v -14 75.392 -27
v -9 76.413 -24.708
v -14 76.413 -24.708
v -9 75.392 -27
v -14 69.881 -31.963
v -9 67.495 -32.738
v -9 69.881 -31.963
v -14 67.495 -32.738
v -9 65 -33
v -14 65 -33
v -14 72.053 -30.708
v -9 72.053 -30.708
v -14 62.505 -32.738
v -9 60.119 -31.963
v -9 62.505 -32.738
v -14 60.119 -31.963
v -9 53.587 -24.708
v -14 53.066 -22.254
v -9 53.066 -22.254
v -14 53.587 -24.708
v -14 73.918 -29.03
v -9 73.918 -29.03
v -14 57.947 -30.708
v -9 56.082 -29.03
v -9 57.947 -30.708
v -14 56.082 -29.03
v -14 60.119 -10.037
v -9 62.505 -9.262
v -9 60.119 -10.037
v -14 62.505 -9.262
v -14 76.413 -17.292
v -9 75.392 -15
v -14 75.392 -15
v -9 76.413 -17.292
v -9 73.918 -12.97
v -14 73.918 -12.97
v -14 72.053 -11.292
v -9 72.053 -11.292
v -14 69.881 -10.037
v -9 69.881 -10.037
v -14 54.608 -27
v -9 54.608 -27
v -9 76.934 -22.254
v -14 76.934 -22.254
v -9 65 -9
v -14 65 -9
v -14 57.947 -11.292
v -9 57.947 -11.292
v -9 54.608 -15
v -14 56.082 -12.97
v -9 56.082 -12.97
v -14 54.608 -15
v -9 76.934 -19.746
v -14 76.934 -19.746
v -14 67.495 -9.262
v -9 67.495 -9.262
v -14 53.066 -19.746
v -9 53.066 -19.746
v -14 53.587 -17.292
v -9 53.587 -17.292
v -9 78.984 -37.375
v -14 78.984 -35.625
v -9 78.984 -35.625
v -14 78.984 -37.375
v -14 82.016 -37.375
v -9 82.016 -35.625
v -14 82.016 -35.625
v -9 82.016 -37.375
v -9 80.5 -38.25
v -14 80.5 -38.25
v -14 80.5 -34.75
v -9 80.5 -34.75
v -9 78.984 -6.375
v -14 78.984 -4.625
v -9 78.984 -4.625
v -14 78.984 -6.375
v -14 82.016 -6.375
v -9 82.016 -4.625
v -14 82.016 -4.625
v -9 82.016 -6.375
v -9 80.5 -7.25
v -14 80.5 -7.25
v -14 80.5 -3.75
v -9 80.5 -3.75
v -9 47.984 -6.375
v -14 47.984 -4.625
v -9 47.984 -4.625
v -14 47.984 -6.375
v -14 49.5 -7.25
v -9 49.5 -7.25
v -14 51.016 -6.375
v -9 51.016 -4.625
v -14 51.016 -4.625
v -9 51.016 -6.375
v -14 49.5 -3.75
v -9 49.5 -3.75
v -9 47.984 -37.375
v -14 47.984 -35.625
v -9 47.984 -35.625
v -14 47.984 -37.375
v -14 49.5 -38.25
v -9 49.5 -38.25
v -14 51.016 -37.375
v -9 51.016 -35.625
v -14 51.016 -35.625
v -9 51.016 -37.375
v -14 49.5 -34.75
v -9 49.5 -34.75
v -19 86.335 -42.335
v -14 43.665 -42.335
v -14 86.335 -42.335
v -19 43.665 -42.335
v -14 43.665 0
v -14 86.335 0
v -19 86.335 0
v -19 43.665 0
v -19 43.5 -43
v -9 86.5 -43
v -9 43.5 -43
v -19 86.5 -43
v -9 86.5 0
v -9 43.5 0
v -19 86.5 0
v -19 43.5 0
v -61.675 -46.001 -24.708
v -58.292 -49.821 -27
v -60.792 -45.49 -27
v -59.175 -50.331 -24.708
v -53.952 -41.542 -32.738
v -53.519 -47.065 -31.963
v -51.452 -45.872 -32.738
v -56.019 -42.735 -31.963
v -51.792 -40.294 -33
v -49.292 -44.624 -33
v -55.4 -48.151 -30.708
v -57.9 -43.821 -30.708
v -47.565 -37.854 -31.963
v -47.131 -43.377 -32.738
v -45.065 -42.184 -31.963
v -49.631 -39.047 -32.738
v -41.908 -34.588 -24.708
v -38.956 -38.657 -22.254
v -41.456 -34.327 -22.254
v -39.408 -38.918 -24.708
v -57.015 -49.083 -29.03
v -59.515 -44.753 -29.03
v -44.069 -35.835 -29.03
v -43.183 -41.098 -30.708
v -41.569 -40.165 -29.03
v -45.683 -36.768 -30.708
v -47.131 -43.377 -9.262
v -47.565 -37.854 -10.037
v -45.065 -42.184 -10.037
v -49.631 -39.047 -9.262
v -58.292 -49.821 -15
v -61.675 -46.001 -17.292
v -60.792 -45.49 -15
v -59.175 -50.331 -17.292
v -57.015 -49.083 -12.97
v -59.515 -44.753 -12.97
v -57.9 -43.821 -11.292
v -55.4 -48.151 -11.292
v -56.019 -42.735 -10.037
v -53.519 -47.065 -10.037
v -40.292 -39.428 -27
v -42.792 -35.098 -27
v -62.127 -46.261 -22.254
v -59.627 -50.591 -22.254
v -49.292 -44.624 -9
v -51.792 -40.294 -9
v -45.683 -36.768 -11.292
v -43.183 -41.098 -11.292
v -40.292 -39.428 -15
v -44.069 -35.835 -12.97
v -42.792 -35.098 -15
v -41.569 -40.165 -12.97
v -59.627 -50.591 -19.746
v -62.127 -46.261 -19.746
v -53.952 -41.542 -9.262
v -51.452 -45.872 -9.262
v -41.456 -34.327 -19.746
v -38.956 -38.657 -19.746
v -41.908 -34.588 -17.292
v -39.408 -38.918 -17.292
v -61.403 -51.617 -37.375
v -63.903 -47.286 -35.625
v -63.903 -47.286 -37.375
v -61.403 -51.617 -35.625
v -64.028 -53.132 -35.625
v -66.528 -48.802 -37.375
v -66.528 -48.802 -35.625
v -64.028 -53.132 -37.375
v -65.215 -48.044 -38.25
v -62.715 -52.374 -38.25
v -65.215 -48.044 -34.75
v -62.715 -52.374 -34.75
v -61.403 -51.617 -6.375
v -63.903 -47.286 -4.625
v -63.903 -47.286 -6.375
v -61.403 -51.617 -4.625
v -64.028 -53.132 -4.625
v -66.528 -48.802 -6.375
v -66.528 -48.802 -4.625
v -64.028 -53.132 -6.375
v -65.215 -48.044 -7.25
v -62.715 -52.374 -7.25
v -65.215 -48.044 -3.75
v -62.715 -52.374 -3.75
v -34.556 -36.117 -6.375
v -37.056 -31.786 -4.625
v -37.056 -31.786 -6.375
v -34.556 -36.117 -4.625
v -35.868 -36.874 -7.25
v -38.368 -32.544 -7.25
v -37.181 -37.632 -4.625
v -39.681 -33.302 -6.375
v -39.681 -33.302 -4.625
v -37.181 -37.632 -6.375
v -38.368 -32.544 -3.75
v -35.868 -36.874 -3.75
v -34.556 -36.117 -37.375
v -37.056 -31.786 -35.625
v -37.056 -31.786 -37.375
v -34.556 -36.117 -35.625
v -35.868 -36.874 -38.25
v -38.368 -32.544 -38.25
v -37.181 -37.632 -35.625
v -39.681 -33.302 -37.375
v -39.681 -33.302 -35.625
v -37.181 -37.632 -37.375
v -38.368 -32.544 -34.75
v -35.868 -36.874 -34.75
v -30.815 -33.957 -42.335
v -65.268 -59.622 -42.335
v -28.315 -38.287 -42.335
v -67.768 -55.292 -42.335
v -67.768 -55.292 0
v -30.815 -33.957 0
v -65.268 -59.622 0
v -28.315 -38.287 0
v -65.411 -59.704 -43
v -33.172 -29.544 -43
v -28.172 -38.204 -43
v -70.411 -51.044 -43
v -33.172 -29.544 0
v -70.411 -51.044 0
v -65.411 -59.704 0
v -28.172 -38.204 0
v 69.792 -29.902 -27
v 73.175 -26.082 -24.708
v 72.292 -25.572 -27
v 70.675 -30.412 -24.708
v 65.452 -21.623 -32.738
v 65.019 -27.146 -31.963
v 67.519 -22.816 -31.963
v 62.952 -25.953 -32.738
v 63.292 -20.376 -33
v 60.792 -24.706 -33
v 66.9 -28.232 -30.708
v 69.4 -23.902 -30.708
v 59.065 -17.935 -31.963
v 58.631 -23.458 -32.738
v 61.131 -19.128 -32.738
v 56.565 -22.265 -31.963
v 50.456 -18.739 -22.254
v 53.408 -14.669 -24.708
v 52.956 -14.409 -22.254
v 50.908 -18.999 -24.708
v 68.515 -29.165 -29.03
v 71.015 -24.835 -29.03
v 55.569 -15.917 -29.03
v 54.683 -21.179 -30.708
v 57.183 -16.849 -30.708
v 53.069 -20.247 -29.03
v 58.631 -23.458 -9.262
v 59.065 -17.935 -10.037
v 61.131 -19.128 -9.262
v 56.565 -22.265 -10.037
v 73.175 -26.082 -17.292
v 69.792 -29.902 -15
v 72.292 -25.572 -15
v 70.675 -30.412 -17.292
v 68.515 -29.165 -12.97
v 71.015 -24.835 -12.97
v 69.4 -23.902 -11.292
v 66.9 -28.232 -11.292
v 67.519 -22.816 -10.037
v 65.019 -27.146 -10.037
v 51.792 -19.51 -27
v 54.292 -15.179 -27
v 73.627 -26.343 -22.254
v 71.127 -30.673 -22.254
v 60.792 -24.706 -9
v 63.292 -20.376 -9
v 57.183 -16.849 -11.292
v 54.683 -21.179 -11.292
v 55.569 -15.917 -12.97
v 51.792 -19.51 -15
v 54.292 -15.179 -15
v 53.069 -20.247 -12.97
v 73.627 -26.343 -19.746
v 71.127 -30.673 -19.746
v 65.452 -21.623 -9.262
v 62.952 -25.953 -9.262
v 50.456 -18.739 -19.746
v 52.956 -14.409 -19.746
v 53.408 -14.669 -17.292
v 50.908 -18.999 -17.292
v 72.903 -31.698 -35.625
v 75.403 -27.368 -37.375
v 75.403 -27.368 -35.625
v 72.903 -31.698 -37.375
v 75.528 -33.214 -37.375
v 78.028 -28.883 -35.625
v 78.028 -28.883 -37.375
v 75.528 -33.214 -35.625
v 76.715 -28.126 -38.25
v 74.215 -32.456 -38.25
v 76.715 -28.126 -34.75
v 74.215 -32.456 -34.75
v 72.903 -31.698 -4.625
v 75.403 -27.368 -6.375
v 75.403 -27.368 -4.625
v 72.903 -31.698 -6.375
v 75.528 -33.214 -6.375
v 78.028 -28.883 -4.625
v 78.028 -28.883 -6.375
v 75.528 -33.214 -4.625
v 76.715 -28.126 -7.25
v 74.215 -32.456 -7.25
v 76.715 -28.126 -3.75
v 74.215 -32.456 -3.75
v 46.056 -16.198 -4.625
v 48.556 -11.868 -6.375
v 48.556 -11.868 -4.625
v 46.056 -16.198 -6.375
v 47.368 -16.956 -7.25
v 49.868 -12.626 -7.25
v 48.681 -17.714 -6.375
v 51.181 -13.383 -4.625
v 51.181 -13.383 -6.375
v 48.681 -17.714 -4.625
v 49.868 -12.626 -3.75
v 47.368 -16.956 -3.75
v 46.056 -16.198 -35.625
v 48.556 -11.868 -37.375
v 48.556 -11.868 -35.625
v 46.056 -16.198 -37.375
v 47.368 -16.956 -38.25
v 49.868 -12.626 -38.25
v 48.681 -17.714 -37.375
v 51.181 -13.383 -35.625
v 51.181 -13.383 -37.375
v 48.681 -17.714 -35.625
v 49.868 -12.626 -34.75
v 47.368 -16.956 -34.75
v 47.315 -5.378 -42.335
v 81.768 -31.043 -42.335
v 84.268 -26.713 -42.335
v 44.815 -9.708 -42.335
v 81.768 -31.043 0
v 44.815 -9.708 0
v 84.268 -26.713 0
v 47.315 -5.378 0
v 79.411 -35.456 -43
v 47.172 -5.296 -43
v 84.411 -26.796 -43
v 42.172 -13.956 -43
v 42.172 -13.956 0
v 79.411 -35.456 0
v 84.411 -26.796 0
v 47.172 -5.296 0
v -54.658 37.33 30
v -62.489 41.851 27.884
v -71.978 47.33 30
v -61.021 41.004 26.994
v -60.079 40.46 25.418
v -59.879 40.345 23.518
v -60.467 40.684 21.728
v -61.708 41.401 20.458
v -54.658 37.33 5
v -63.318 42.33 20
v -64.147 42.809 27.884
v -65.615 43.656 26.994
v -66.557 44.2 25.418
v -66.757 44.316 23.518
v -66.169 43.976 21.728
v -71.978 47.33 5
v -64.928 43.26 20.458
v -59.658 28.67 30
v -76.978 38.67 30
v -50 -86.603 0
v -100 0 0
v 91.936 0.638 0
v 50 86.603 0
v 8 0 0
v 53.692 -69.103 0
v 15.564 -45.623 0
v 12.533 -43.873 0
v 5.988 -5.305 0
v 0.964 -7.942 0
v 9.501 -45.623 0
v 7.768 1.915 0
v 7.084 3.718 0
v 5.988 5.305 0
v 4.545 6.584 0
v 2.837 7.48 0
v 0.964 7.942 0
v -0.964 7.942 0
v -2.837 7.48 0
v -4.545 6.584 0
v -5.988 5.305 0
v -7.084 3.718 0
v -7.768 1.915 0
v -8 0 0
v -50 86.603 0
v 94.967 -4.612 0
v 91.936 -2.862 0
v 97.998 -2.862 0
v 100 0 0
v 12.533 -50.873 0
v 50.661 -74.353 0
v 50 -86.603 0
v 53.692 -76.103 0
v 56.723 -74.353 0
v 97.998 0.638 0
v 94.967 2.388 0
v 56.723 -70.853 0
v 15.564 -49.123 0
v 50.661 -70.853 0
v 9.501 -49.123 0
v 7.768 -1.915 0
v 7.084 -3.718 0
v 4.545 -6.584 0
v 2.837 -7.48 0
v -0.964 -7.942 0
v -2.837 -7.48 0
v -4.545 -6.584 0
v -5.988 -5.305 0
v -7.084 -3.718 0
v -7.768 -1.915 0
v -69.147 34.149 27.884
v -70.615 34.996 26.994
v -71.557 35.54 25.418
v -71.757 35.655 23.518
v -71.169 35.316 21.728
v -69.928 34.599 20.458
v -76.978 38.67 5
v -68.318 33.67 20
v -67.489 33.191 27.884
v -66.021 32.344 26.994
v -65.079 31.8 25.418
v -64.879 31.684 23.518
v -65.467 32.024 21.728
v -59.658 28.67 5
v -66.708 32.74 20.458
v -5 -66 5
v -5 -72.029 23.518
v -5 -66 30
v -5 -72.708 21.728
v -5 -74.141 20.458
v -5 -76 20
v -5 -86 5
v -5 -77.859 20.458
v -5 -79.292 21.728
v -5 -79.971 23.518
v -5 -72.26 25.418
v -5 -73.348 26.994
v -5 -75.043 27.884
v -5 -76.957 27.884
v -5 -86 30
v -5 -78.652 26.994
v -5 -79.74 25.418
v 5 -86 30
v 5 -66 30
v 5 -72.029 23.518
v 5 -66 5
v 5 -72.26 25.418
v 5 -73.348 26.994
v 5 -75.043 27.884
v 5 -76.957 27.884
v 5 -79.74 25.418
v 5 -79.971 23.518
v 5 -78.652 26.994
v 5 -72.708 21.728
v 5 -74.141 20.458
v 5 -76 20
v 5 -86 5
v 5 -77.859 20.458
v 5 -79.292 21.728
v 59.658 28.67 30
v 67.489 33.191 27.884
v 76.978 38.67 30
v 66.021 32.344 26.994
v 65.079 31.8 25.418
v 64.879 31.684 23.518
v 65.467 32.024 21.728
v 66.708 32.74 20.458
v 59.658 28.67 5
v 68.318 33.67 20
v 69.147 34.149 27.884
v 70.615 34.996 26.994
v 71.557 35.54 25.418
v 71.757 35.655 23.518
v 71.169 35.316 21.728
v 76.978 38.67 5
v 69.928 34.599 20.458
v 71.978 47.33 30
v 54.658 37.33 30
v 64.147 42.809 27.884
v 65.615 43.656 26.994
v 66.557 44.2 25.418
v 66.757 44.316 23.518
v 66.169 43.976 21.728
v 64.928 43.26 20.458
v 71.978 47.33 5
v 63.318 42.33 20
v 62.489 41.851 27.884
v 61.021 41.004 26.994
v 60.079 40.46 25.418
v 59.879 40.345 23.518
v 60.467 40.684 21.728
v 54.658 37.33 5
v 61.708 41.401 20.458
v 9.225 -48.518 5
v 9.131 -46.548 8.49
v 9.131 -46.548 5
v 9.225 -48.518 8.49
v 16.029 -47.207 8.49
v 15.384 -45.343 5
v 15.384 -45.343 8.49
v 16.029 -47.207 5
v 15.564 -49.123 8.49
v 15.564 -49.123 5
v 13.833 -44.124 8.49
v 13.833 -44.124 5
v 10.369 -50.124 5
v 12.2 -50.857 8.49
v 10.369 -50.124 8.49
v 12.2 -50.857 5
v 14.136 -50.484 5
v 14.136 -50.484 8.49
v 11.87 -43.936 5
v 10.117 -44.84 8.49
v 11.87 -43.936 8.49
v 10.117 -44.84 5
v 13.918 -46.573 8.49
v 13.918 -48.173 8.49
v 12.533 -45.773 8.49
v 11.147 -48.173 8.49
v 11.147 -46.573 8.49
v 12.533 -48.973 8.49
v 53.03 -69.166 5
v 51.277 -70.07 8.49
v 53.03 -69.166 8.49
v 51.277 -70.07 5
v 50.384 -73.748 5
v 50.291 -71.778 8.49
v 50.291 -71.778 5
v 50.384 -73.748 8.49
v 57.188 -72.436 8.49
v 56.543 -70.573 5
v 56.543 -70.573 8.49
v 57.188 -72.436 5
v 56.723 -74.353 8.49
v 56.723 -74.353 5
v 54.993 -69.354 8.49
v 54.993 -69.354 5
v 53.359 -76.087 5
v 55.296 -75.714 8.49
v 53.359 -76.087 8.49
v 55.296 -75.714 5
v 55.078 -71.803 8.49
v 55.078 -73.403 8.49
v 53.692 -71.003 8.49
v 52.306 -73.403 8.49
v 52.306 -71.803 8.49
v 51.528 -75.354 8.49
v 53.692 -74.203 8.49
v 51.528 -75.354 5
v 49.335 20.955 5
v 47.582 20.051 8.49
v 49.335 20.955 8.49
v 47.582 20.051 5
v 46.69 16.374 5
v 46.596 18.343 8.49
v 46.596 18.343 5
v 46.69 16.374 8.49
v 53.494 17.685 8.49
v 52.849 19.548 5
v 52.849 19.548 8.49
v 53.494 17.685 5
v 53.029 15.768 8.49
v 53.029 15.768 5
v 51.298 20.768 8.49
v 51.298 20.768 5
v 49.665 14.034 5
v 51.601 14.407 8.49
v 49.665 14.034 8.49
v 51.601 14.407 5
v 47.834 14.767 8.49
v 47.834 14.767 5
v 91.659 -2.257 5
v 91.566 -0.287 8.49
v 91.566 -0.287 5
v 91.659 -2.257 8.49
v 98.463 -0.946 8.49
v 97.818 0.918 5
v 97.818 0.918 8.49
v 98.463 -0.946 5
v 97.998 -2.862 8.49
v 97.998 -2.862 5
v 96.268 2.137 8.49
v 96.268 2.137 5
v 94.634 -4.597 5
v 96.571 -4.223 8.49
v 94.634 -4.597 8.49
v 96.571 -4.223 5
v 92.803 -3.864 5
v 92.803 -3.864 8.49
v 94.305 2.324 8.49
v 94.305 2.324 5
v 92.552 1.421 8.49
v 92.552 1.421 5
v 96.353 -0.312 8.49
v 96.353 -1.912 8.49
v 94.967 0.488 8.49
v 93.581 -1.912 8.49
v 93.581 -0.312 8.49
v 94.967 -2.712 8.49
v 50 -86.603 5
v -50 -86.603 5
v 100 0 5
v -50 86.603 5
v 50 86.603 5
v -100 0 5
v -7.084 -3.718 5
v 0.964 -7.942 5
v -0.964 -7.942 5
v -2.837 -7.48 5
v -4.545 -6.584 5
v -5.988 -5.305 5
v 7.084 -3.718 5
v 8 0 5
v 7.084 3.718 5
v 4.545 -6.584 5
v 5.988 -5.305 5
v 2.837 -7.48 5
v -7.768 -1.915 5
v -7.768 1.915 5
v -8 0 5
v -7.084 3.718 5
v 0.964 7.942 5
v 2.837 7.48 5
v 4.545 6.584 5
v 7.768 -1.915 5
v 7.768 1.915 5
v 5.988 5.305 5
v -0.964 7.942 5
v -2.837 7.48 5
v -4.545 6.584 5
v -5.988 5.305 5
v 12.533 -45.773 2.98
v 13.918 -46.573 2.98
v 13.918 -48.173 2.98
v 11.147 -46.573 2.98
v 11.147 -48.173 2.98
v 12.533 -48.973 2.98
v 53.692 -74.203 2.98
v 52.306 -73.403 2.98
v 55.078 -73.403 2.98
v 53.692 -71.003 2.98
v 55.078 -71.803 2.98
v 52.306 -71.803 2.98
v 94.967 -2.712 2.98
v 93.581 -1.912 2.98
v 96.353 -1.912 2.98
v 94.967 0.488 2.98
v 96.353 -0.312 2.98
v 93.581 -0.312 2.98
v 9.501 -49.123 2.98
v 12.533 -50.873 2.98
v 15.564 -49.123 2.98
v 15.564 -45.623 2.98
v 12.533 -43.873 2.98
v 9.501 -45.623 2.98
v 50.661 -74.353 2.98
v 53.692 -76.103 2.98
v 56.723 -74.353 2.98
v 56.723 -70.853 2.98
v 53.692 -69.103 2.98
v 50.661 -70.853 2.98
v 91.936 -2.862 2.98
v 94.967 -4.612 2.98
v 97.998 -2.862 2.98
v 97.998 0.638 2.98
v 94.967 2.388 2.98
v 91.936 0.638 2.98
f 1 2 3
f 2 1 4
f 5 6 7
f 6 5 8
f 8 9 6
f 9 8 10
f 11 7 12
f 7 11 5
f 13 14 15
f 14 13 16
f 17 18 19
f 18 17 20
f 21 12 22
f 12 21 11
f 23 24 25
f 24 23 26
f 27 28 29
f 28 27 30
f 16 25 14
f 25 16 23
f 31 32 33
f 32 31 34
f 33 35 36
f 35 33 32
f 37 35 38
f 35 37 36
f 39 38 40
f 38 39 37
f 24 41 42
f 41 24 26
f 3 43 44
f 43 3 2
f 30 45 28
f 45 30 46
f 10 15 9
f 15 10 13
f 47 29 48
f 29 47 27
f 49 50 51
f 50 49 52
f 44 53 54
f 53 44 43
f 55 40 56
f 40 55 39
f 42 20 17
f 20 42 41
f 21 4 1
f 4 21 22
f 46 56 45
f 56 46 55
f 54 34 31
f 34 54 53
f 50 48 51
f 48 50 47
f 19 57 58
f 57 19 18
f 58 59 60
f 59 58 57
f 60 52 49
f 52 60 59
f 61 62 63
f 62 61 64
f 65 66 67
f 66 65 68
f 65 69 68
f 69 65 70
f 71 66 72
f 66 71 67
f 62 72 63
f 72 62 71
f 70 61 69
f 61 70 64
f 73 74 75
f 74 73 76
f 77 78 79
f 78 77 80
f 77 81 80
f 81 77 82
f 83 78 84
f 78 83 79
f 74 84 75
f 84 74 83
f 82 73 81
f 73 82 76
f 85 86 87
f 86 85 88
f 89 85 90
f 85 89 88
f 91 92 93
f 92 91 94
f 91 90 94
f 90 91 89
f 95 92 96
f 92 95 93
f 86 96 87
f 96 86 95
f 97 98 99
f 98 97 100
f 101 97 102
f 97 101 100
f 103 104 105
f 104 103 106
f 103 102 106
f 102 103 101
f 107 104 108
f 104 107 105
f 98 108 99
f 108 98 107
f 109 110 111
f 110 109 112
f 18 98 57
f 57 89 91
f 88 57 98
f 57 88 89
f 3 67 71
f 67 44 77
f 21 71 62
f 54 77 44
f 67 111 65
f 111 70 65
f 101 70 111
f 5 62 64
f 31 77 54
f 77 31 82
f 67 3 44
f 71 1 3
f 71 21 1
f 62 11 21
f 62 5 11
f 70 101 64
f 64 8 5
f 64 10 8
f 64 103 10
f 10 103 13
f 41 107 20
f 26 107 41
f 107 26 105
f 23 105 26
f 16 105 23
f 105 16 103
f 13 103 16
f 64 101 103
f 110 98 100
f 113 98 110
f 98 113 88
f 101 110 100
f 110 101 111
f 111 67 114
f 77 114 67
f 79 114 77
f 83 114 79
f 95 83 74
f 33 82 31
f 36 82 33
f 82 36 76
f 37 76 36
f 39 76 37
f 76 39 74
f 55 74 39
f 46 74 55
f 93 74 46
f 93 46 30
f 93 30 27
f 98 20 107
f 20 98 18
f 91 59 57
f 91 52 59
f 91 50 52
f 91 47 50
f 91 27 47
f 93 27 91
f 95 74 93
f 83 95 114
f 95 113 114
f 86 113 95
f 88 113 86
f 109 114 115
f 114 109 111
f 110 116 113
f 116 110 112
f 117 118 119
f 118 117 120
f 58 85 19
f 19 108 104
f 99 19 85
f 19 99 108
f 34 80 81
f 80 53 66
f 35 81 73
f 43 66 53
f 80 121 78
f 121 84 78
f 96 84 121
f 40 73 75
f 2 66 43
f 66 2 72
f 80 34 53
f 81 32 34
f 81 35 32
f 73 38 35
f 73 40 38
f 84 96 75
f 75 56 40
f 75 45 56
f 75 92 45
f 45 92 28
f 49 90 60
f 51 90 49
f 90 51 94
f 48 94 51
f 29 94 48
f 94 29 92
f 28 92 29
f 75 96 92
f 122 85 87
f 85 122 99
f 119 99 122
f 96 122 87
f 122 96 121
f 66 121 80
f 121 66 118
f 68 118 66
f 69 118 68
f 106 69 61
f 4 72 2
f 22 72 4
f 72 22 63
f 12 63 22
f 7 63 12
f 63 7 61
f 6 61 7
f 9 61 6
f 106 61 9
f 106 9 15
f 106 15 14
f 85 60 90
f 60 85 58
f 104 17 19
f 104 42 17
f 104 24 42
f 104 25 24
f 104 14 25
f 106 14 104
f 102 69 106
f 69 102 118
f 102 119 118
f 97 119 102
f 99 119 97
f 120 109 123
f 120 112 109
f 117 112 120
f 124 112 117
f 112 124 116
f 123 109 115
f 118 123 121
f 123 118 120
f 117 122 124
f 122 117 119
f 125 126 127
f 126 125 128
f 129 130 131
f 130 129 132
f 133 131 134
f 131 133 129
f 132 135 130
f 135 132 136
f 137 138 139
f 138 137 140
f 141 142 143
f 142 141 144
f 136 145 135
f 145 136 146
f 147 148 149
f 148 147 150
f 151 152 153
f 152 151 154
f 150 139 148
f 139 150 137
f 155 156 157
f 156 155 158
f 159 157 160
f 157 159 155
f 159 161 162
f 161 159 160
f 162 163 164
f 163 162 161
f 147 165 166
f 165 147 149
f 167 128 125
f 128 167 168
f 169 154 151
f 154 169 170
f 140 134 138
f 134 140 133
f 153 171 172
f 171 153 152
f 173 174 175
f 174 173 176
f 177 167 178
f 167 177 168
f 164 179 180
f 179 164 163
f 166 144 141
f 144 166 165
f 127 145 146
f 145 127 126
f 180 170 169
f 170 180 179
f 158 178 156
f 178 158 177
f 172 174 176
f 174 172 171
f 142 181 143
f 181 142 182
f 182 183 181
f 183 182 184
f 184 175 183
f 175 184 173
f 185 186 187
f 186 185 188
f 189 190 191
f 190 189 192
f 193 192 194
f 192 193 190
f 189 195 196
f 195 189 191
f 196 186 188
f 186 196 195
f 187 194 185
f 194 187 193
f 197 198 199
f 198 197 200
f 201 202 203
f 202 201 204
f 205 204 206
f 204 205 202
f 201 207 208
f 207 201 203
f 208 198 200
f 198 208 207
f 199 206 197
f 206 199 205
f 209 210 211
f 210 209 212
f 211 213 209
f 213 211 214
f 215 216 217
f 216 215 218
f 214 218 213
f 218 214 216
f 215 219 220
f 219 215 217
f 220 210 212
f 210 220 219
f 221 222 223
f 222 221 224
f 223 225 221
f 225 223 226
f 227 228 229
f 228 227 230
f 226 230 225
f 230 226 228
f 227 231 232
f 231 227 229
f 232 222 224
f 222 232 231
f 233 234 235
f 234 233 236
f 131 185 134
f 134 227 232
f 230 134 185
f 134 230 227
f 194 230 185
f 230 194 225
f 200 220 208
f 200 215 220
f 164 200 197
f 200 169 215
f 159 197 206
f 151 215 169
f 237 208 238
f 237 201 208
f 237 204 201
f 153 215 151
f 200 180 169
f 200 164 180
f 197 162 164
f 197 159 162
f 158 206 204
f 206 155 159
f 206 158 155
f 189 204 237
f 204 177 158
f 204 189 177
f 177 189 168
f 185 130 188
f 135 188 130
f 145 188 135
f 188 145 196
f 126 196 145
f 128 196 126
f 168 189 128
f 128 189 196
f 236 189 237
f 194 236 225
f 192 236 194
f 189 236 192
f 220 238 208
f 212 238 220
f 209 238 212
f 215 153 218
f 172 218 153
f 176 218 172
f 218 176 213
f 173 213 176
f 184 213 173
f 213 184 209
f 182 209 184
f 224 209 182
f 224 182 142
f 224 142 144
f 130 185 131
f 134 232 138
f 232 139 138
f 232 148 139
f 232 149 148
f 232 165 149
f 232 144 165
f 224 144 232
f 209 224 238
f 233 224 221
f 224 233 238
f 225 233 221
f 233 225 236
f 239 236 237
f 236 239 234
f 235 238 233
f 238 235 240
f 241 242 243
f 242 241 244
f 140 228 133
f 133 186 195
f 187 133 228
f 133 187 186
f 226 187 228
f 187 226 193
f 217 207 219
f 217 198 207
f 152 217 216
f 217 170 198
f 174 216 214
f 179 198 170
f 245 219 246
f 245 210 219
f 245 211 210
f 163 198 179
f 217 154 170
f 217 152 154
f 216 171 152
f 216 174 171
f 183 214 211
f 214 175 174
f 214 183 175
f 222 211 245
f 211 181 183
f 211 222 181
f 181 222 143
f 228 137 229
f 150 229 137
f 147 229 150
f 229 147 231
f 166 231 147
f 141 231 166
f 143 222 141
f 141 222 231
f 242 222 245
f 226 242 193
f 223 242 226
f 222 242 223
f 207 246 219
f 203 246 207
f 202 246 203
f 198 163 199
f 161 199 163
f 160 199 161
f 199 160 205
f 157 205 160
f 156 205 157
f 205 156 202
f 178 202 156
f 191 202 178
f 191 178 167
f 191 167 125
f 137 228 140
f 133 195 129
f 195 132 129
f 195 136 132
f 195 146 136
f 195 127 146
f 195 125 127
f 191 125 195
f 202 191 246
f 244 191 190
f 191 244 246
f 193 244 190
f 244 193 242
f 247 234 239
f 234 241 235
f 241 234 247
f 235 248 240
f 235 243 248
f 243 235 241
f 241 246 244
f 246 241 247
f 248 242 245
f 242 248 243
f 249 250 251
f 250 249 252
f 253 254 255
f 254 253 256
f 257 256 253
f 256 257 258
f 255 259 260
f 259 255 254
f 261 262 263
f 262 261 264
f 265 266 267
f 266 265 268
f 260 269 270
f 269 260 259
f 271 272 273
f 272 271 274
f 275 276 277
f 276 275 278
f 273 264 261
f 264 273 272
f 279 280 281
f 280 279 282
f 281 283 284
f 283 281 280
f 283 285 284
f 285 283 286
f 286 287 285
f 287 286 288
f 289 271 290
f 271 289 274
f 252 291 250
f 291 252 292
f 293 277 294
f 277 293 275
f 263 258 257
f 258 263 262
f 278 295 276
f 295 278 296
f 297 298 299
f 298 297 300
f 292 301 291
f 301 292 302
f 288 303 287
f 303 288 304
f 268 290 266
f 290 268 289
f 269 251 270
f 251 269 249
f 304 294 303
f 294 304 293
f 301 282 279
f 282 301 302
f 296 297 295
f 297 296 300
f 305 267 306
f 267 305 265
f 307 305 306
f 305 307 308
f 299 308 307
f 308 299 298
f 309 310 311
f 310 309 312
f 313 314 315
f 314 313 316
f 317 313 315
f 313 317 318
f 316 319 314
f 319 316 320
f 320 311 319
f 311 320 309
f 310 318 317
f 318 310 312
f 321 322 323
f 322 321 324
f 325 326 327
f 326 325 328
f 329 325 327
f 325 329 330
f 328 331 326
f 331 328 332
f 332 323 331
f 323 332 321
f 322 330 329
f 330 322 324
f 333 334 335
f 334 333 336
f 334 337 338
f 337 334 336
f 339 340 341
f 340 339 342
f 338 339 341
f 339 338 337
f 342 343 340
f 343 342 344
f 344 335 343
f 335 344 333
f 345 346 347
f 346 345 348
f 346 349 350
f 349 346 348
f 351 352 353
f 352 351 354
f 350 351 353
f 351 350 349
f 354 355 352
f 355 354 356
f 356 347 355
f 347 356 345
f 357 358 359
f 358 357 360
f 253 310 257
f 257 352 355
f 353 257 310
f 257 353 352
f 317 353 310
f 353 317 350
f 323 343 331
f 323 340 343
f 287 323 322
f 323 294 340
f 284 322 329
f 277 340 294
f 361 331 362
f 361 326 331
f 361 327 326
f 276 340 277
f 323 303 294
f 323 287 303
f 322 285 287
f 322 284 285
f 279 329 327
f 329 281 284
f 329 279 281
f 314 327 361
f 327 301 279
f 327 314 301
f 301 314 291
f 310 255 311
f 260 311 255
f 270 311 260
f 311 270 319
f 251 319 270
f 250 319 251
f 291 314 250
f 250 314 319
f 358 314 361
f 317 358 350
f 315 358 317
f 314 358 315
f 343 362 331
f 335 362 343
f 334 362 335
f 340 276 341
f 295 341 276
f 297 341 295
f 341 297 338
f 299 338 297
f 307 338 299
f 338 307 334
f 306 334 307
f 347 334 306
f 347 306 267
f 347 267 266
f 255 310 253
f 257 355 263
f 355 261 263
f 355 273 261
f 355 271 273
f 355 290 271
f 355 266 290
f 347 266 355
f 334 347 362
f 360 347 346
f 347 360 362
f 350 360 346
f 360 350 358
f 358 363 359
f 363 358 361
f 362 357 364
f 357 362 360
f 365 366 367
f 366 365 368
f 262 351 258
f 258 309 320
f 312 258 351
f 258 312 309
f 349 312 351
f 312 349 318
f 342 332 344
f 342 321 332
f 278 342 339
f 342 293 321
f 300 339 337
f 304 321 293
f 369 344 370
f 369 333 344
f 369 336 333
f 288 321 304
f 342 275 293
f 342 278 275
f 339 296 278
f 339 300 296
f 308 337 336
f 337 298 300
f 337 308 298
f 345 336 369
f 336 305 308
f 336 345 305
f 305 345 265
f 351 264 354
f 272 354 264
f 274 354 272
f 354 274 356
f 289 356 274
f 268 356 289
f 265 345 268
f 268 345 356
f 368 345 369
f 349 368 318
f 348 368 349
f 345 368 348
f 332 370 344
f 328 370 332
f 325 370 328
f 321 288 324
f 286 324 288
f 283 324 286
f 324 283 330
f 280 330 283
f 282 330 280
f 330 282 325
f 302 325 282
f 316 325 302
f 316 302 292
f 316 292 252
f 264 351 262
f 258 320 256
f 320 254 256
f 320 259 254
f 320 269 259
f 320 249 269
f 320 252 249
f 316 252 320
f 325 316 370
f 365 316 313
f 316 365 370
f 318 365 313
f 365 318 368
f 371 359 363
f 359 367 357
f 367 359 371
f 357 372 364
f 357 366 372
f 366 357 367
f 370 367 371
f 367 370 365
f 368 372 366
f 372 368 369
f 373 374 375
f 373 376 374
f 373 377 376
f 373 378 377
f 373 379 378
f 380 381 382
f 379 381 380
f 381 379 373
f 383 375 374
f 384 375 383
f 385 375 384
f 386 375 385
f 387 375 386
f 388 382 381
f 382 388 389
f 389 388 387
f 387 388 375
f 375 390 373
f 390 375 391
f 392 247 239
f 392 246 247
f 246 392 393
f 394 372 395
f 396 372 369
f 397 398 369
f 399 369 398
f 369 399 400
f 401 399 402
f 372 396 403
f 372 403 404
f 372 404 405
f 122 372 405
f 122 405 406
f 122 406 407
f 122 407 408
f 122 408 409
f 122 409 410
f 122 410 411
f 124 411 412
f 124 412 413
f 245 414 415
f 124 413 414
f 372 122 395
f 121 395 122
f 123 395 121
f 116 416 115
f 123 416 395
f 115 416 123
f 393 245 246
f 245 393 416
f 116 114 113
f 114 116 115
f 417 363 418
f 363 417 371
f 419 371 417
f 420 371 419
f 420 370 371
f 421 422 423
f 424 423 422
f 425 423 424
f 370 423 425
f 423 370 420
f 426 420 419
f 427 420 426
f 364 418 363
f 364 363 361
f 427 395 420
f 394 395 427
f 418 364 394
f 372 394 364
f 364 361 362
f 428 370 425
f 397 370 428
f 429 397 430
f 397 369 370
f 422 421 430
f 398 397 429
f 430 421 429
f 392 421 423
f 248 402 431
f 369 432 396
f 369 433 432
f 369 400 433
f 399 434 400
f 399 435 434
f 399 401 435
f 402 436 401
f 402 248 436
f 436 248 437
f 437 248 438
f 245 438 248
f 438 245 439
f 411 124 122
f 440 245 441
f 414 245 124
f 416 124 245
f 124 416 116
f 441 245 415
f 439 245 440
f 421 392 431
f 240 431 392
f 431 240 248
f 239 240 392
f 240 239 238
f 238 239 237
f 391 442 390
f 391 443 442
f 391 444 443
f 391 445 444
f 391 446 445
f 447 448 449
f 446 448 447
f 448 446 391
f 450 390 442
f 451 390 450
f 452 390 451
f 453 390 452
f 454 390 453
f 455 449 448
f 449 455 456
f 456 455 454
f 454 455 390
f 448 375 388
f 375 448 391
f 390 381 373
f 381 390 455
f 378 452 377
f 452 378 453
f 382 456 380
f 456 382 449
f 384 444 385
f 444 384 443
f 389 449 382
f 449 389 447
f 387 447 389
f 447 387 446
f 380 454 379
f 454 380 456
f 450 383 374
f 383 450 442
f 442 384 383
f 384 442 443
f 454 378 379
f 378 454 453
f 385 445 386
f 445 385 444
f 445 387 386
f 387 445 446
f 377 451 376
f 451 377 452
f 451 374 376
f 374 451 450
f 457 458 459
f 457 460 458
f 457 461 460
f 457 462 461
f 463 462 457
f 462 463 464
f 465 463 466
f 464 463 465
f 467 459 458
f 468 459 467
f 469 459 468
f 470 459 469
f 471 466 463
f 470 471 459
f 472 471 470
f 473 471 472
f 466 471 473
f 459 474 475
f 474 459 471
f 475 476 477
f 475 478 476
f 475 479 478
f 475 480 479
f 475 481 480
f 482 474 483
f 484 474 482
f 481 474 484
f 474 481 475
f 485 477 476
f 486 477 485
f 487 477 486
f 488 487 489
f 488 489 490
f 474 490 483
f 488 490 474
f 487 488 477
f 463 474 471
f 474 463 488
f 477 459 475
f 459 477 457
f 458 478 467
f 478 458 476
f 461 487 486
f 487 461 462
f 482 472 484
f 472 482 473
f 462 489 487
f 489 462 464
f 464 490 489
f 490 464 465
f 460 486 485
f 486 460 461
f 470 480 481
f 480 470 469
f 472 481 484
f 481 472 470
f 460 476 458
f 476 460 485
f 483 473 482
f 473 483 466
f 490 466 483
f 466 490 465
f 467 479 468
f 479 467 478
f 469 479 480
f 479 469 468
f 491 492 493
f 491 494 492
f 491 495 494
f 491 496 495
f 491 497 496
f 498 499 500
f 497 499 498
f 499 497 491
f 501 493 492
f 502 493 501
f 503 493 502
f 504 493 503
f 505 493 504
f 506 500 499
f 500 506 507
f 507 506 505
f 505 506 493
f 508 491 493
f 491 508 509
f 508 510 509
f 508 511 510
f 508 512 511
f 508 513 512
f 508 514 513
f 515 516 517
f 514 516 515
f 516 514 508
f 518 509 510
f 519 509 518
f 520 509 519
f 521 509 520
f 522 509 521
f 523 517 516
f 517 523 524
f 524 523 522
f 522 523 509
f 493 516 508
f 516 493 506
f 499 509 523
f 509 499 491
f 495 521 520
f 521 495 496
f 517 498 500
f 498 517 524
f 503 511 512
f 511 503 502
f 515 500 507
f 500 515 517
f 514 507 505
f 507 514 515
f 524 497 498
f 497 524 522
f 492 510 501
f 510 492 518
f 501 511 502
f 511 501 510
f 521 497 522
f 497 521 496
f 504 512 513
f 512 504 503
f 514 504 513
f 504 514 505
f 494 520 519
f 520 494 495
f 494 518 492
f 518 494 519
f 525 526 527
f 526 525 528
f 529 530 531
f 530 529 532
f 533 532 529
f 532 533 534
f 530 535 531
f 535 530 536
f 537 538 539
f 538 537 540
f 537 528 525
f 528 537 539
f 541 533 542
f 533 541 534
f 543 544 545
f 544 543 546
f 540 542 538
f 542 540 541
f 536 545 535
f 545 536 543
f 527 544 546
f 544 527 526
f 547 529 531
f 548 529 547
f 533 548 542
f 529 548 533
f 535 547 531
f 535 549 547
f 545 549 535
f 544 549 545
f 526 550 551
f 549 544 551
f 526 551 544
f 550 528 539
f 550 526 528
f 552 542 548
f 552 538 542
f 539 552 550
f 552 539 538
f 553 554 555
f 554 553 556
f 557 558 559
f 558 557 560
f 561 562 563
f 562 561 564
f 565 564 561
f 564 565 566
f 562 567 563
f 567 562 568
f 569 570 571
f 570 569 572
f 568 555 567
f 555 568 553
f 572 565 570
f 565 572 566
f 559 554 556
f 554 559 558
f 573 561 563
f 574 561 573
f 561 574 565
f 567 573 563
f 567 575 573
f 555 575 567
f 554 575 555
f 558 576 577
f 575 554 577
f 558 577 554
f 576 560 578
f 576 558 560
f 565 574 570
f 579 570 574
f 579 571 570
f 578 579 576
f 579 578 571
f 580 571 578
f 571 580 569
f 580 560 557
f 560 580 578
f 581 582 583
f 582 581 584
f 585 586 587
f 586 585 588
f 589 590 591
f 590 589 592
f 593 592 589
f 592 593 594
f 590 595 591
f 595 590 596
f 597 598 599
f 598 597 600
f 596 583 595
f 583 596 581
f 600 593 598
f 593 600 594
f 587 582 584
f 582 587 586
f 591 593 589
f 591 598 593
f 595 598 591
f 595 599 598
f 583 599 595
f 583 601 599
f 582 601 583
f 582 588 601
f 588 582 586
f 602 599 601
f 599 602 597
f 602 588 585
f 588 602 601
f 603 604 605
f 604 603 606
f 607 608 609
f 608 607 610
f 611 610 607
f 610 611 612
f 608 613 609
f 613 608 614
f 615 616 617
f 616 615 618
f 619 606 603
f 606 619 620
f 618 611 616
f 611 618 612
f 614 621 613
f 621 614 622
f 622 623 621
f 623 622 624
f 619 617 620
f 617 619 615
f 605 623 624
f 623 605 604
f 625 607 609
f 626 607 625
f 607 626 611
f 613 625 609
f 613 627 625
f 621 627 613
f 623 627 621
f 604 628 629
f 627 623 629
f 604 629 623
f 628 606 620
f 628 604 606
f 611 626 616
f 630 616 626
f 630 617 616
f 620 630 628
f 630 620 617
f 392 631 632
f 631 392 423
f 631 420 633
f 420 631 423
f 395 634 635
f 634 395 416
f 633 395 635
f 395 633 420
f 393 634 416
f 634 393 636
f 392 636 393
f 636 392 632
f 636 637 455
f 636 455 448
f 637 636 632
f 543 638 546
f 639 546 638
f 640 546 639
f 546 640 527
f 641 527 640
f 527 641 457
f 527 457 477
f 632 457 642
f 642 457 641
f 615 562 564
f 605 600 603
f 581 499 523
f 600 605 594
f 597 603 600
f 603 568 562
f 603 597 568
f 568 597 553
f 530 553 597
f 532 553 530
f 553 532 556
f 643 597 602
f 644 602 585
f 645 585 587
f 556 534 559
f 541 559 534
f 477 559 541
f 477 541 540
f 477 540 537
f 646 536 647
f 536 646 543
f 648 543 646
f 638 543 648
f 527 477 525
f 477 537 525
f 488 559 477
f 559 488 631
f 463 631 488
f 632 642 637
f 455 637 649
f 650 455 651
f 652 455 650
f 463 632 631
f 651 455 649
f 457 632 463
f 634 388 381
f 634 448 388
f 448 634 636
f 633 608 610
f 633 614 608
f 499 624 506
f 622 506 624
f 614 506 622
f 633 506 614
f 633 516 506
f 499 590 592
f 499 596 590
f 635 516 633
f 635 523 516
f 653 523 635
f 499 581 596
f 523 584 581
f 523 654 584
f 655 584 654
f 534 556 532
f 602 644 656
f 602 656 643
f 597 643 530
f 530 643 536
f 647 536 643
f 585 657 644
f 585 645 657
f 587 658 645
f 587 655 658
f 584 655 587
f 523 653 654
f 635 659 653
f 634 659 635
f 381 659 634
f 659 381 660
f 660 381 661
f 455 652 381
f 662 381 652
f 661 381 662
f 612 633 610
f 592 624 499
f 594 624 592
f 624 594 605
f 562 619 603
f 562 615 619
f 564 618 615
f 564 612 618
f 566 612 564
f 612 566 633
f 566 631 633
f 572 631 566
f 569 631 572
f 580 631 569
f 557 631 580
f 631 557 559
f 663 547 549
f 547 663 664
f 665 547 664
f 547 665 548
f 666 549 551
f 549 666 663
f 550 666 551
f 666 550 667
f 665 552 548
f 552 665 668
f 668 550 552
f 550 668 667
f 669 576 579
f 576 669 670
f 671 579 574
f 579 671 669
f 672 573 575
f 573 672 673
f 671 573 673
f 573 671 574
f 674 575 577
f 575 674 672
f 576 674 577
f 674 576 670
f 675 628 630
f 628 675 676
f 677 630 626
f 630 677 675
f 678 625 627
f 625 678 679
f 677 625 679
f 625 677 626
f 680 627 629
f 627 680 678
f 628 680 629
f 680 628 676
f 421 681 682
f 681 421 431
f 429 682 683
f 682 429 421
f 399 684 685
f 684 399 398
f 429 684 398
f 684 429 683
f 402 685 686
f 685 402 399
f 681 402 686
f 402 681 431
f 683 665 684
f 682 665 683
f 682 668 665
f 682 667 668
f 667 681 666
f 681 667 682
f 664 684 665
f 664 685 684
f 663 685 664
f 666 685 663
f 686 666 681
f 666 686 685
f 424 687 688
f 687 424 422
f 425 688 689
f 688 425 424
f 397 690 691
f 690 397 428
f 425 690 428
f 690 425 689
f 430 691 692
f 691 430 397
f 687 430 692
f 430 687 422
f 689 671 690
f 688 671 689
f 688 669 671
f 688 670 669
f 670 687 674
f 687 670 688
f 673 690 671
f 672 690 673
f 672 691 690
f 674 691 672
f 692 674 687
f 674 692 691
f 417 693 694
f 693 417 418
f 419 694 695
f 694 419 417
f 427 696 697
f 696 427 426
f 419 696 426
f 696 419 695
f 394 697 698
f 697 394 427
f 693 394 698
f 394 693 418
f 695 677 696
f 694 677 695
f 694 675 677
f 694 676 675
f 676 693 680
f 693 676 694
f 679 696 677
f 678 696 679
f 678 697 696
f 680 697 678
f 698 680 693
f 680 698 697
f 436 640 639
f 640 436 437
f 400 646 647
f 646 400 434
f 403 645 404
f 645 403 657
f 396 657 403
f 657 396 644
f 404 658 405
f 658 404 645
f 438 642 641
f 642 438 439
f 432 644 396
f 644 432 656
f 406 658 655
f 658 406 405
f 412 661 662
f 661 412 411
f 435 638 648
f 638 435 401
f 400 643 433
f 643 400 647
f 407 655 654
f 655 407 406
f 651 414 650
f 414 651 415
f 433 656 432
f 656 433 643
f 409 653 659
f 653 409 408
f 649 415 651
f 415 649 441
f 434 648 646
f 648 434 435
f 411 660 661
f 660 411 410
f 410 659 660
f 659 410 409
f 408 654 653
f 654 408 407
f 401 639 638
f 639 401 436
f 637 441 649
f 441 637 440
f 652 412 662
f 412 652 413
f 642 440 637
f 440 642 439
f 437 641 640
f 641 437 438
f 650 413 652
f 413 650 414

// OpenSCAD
// file: cointube.scad
/*
 * PARAMETRIC COIN TUBES + CAP
 * VERSION 1.3.1
 * last update: 02/12/13
 * design by newq 
 * mod kitwallace (thanks!)
 */

// 
// the generated tubes insides are 2 coins higher than the number of coins they fit

coin_type = 13; // [ 0:1 Euro, 1:2 Euro, 2:50 Euro cents,  3:20 Euro cents, 4:10 Euro cents, 5:5 Euro cents, 6:2 Euro cent, 7: 1 Euro cent, 8: 1 US Dollar, 9: 0.50 US Dollar, 10: 0.25 US Dollar, 11: 0.10 US Dollar, 12: 0.05 US Dollar, 13: 0.01 US Dollar, 14: 2 Canadian Dollar, 15: 1 Canadian Dollar, 16: 0.50 Canadian Dollar, 17: 0.25 Canadian Dollar, 18: 0.10 Canadian Dollar, 19: 0.05 Canadian Dollar, 20: 0.01 Canadian Dollar]

// how many stacked coins should fit in a tube
number_of_coins = 25; 
number_of_tubes = 3; 

// Do you want to print the tubes?
generate_tube = 1; // [1:Yes, 0:No] 
// Do you want a cap to close the tube?
generate_cap = 0; // [1:Yes, 0:No] 
// thickness of wall and bottom (mm)
tube_wall = 2;  
// clearance from coin to wall of tube (mm) 
clearance = 0.4;
// if the cap fits too tight you might decrease slightly
fudge_factor = 0.975; 

// NOTHING TO SEE HERE :)

// coin data - name, diameter, height
coins = [ 
              ["1 Euro", 23.25, 2.33], 
              ["2 Euro", 25.75, 2.20],
              ["50 Euro cents", 24.25, 2.38],
              ["20 Euro cents", 22.25, 2.14],
              ["10 Euro cents", 19.75, 1.93],
              ["5 Euro cents", 21.25, 1.67],
              ["2 Euro cents", 18.75, 1.67],
              ["1 Euro cents", 16.25, 1.67],
              ["1 US Dollar", 26.50, 2.00],
              ["0.50 US Dollar", 30.61, 2.15],
              ["0.25 US Dollar", 24.26, 1.75],
              ["0.10 US Dollar", 17.91, 1.35],
              ["0.05 US Dollar", 21.21, 1.95],
              ["0.01 US Dollar", 19.05, 1.55],
              ["2 Canadian Dollar", 28.00, 1.80],
              ["1 Canadian Dollar", 26.50, 1.75],
              ["0.50 Canadian Dollar", 27.13, 1.95],
              ["0.25 Canadian Dollar", 23.88, 1.58],
              ["0.10 Canadian Dollar", 18.03, 1.22],
              ["0.05 Canadian Dollar", 21.2, 1.76],
              ["0.01 Canadian Dollar", 19.05, 1.45]
            ];

coin_diameter = coins[coin_type][1];
coin_height = coins[coin_type][2];

// generating the tubes
module coinTube(){
if (generate_tube) {
  assign(cyl_inner_h = (coin_height * number_of_coins) + (4 * tube_wall),
             cyl_inner_r = (coin_diameter / 2) + clearance,

             cyl_outer_h = (coin_height * number_of_coins) + (3 * tube_wall),
             cyl_outer_r = (coin_diameter / 2) + tube_wall + clearance,

             cutout_x = coin_diameter + (4 * tube_wall),
             cutout_y = (coin_diameter / 2),
             cutout_z = (coin_height * number_of_coins) + (3 * tube_wall)
             )


  for (z = [0 : (number_of_tubes-1)]){

	translate (v = [0, z * (cyl_outer_r * 2 - tube_wall), 0]){
		difference(){	
			difference(){
				difference() {
					// outer tube
					cylinder(h = cyl_outer_h, r = cyl_outer_r);
					// inner tube
					translate(v = [0, 0, tube_wall]) {
						cylinder(h = cyl_inner_h, r = cyl_inner_r);
					}
				}
				// round bottom cutout
				translate (v = [0, 0, ((cutout_z / 2) + tube_wall)]){
					cube(size = [cutout_x, cutout_y, cutout_z], center = true);
				}
			}
			// cutout
			translate (v = [0, 0, -tube_wall]){
				cylinder(h = (cyl_inner_h + tube_wall), r = (cyl_inner_r - tube_wall));
			}
		}
   }
}

}
}
//coinTube();

// generating the tube tops

if (generate_cap) {
   assign (cyl_inner_h = 3*tube_wall - clearance,
               cyl_inner_r = ((coin_diameter / 2) + clearance) * fudge_factor,

               cyl_outer_h = tube_wall,
               cyl_outer_r = (coin_diameter / 2) + tube_wall + clearance,

               cutout_x = coin_diameter + (4 * tube_wall),
               cutout_y = (coin_diameter / 2) * fudge_factor,
               cutout_z = 3*tube_wall - clearance
             )
    translate([1.5 * coin_diameter + tube_wall, 0, 0]){
	for (z = [0 : (number_of_tubes-1)]){
		
		translate (v = [0, z * (cyl_outer_r * 2 - tube_wall), 0]){
			difference(){
				union(){		
					cylinder(h = cyl_outer_h, r = cyl_outer_r);
					cylinder(h = cyl_inner_h, r = cyl_inner_r);
				
					intersection(){
						translate([0,0,cutout_z/2]){
							cube(size = [cutout_x, cutout_y, cutout_z], center = true);
						}
						cylinder(h = cyl_outer_h+10, r = cyl_outer_r);
					}
				}
				
				translate([0,0,-(cyl_inner_h /2)]){
					cylinder(h = cyl_inner_h *2, r = cyl_inner_r - tube_wall);
				}			
			}		
		}
	}	
}
}
// file: rampsMount.scad
module rampsMount()
{
	translate([6.54, 17.24, 0])
        cylinder(r=3.5, h=3.5);
    translate([54.8, 15.97, 0])
        cylinder(r=3.5, h=3.5);
    translate([6.54, 92.17, 0])
        cylinder(r=3.5, h=3.5);
    translate([54.8, 98.52, 0])
        cylinder(r=3.5, h=3.5);
}
module mountHoles()
{
    translate([6.54, 17.24, -3])
        cylinder(r=1.6, h=20);
    translate([54.8, 15.97, -3])
        cylinder(r=1.6, h=20);
    translate([54.8, 98.52, -3])
        cylinder(r=1.6, h=20);
    translate([6.54, 17.24, -3])
        cylinder(r=3.5, h=3, $fn=6);
    translate([54.8, 15.97, -3])
        cylinder(r=3.5, h=3, $fn=6);
    translate([54.8, 98.52, -3])
        cylinder(r=3.5, h=3, $fn=6);
}
//rampsMount();
//mountHoles();
// file: utl.NEMA.scad
// Model: NEMA23
// Model: NEMA17
// Author: Bogdan Kecman
// Licence: GPL
//
// Usage:
// nema17(1); //nema17 double shaft
//nema17(); //nema17 siingle shaft
// nema23(1, 1); //nema23 double shaft cylinder
// nema23(1); //nema23 double shaft cube
// nema23(); //nema23 single shaft cube
// nema23(0,1); //nema23 single shaft cylinder
//nema17DiffBlock();  //nema 17 block for subtracting to make mounts


module nema23(has_back, is_cylinder){
  mplate = 56.9; //mounting plate width
  mplateH = 5.3; //mounting plate height

  ringR = 38.10 / 2; //ring radius
  ringH = 1.3; //ring thickness

  shaftR = 6.337/2; //shaft radius
  shaftH = 20.6;  //shaft lenght

  bodyL = 46.5; //46.5, 56.1, 77.7, 103.1, ...
  bodyInnerCube = 37.6;

  holeR = 5.21/2;
  holeL = 47.14/2; //distance between hole centres

  difference(){
    union(){
      //mounting plate
      color([0.7,0.7,0.7]) cube(size = [mplate,mplate,mplateH], center = true);
      //ring
      color([0.7,0.7,0.7]) translate(v=[0,0,mplateH/2+ringH/2]) cylinder(r=ringR, h=ringH, center=true);
      //shaft front
      color([0.9,0.9,0.9]) translate(v=[0,0,mplateH/2+ringH+shaftH/2])cylinder(r=shaftR, h=shaftH, center=true);
      if (has_back == 1){
        color([0.9,0.9,0.9])  translate(v=[0,0,0-bodyL-shaftH/2]) cylinder(r=shaftR, h=shaftH, center=true);
      }
      //body
      if (is_cylinder == 1){
        color([0.1,0.1,0.1]) translate(v=[0,0,0-mplateH/2-bodyL/2]) cylinder(r=mplate/2, h=bodyL, center=true);
      }else{
        union(){
          color([0.1,0.1,0.1]) translate(v=[0,0,0-mplateH/2-bodyL/2]) cube(size = [bodyInnerCube, mplate, bodyL], center=true);
          color([0.1,0.1,0.1]) translate(v=[0,0,0-mplateH/2-bodyL/2]) cube(size = [mplate,bodyInnerCube, bodyL], center=true);
        }
      }
    }
    translate(v=[holeL,holeL,0]) cylinder(r = holeR, h = 2*mplateH, center=true);
    translate(v=[-holeL,holeL,0]) cylinder(r = holeR, h = 2*mplateH, center=true);
    translate(v=[-holeL,-holeL,0]) cylinder(r = holeR, h = 2*mplateH, center=true);
    translate(v=[holeL,-holeL,0]) cylinder(r = holeR, h = 2*mplateH, center=true);
  }
  
}

module nema17(has_back, is_cylinder){
  mplate = 42.67; //mounting plate width
  mplateH = 0; //mounting plate height

  ringR = 22 / 2; //ring radius, can be 21.95/2
  ringH = 2; //ring thickness

  shaftR = 5/2; //shaft radius, can be 4.988/2
  shaftH = 20.07;  //shaft lenght

  bodyL = 46.5; //25.3, 33.13, 34.7, 40.9, 47.0, ...

  holeR = 3.5/2; //M3 or M4 or #4-40
  holeL = 31.0/2; //distance between hole centres

  difference(){
    union(){
      //ring
      color([0.7,0.7,0.7]) translate(v=[0,0,ringH/2]) cylinder(r=ringR, h=ringH, center=true);
      //shaft front
      color([0.9,0.9,0.9]) translate(v=[0,0,ringH+shaftH/2])cylinder(r=shaftR, h=shaftH, center=true);
      if (has_back == 1){
        color([0.9,0.9,0.9]) translate(v=[0,0,0-bodyL-shaftH/2]) cylinder(r=shaftR, h=shaftH, center=true);
      }
      //body
      if (is_cylinder == 1){
        color([0.1,0.1,0.1]) translate(v=[0,0,0-bodyL/2]) cylinder(r=mplate/2*1.2, h=bodyL, center=true);
      }else{
        union(){
          color([0.1,0.1,0.1]) translate(v=[0,0,0-bodyL/2]) cube(size = [mplate, mplate, bodyL], center=true);
          color([0.1,0.1,0.1]) translate(v=[0,0,0-bodyL/2]) cube(size = [mplate, mplate, bodyL], center=true);
        }
      }
    }
    translate(v=[holeL,holeL,0-bodyL/2]) cylinder(r = holeR, h = bodyL+10, center=true);
    translate(v=[-holeL,holeL,0-bodyL/2]) cylinder(r = holeR, h = bodyL+10, center=true);
    translate(v=[-holeL,-holeL,0-bodyL/2]) cylinder(r = holeR, h = bodyL+10, center=true);
    translate(v=[holeL,-holeL,0-bodyL/2]) cylinder(r = holeR, h = bodyL+10, center=true);
  }
  
}
module nema17DiffBlock(){
  mplate = 42.67; //mounting plate width
  mplateH = 0; //mounting plate height

  ringR = 22 / 2; //ring radius, can be 21.95/2
  ringH = 2; //ring thickness

  shaftR = 5/2; //shaft radius, can be 4.988/2
  shaftH = 20.07;  //shaft lenght

  bodyL = 46.5; //25.3, 33.13, 34.7, 40.9, 47.0, ...

  holeR = 3.5/2; //M3 or M4 or #4-40
  holeL = 31.0/2; //distance between hole centres

  
  
      //ring
    color([0.7,0.7,0.7]) translate(v=[0,0,ringH/2]) cylinder(r=ringR+1, h=ringH+30, center=true);
      
    translate(v=[holeL,holeL,0-bodyL/2]) cylinder(r = holeR, h = bodyL+40, center=true);
    translate(v=[-holeL,holeL,0-bodyL/2]) cylinder(r = holeR, h = bodyL+40, center=true);
    translate(v=[-holeL,-holeL,0-bodyL/2]) cylinder(r = holeR, h = bodyL+40, center=true);
    translate(v=[holeL,-holeL,0-bodyL/2]) cylinder(r = holeR, h = bodyL+40, center=true);
  
  
}
// main file
include <utl.NEMA.scad>
include <rampsMount.scad>
include<cointube.scad>
module printerBody(){

    difference(){
        union(){
            //MainBody
            cylinder($fn=6, h=5, r=100);
            //StepperMounts
            for ( i = [0 : 2] ){
                    rotate( i * 120, [0, 0, 1])
                    translate([-14,65,-21]){
                        rotate([0,90,0]){
                            difference(){
                                cube([44,43,10], center=true);
                                nema17DiffBlock();
                                #nema17();
                            }
                            
                        }
                    }
                }
            //TopLineAnchors
            rotate(60,[0,0,1]){
                for ( i = [0 : 2] ){
                    rotate( i * 120, [0, 0, 1])
                    translate([0,76,15]){
                            difference(){
                                cube([10,20,30], center=true);
                                rotate([0,90,0]){
                                    translate([-9,0,-6]){
                                        cylinder(h=12, r=4);
                                    }
                                }
                            }
                        }
                }
            }
            //ramps mounting nubs
            rotate([0,0,330])
            translate([28,-52,4.99]){
                rampsMount();
                
            }
            
            
        }
        //center hole
        translate([0,0,-1]){
            cylinder(h=7, r=8);
        }
        //ramps mounting holes and nut countersinks
        rotate([0,0,330])
            translate([28,-52,2.98]){
                mountHoles();
                
            }
        
    }
}
module spool(){
    difference(){
        union(){
            //near flange
            translate([0,0,9])
                cylinder(d1=19,d2=14, h=5);
            //far flange
            translate([0,0,29])
                cylinder(d=19, h=3);
            difference(){
                //outer spool part
                translate([0,0,.1])
                   cylinder($fn=64, d=14, h=30);
                //inner spool cutout
               cylinder($fn=20, d=12, h=14); 
           }
       }
       //stringhole
       rotate([0,90,0])
       translate([-14,0,-15])
       cylinder(d=2, h=40);
    }
}

printerBody();
//spool();
